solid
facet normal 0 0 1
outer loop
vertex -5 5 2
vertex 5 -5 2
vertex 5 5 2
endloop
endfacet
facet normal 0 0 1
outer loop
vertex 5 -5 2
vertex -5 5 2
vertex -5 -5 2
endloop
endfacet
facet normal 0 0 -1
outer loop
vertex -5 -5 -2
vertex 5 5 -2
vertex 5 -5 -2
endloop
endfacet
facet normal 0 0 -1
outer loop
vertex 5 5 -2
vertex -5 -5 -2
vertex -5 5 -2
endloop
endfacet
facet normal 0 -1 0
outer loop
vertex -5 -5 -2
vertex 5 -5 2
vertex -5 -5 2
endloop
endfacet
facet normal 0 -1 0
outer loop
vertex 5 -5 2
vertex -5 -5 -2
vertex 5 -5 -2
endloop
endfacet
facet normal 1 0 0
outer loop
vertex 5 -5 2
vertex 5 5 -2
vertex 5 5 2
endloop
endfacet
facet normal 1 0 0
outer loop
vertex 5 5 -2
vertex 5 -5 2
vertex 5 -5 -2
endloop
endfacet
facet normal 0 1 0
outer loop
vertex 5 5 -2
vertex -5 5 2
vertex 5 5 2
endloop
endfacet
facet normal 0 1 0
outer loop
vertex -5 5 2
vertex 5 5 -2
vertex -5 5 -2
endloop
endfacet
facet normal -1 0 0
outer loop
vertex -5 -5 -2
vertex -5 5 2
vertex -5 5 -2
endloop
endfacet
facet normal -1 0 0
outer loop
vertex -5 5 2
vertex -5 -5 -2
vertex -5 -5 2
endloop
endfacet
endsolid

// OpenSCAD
// Minimal two-part SCAD for ScadRig sidecar auto-detect tests.
part = "base";
if (part == "base") cube([10, 10, 4], center = true);
if (part == "arm") translate([0, 0, 8]) cube([4, 4, 12], center = true);
